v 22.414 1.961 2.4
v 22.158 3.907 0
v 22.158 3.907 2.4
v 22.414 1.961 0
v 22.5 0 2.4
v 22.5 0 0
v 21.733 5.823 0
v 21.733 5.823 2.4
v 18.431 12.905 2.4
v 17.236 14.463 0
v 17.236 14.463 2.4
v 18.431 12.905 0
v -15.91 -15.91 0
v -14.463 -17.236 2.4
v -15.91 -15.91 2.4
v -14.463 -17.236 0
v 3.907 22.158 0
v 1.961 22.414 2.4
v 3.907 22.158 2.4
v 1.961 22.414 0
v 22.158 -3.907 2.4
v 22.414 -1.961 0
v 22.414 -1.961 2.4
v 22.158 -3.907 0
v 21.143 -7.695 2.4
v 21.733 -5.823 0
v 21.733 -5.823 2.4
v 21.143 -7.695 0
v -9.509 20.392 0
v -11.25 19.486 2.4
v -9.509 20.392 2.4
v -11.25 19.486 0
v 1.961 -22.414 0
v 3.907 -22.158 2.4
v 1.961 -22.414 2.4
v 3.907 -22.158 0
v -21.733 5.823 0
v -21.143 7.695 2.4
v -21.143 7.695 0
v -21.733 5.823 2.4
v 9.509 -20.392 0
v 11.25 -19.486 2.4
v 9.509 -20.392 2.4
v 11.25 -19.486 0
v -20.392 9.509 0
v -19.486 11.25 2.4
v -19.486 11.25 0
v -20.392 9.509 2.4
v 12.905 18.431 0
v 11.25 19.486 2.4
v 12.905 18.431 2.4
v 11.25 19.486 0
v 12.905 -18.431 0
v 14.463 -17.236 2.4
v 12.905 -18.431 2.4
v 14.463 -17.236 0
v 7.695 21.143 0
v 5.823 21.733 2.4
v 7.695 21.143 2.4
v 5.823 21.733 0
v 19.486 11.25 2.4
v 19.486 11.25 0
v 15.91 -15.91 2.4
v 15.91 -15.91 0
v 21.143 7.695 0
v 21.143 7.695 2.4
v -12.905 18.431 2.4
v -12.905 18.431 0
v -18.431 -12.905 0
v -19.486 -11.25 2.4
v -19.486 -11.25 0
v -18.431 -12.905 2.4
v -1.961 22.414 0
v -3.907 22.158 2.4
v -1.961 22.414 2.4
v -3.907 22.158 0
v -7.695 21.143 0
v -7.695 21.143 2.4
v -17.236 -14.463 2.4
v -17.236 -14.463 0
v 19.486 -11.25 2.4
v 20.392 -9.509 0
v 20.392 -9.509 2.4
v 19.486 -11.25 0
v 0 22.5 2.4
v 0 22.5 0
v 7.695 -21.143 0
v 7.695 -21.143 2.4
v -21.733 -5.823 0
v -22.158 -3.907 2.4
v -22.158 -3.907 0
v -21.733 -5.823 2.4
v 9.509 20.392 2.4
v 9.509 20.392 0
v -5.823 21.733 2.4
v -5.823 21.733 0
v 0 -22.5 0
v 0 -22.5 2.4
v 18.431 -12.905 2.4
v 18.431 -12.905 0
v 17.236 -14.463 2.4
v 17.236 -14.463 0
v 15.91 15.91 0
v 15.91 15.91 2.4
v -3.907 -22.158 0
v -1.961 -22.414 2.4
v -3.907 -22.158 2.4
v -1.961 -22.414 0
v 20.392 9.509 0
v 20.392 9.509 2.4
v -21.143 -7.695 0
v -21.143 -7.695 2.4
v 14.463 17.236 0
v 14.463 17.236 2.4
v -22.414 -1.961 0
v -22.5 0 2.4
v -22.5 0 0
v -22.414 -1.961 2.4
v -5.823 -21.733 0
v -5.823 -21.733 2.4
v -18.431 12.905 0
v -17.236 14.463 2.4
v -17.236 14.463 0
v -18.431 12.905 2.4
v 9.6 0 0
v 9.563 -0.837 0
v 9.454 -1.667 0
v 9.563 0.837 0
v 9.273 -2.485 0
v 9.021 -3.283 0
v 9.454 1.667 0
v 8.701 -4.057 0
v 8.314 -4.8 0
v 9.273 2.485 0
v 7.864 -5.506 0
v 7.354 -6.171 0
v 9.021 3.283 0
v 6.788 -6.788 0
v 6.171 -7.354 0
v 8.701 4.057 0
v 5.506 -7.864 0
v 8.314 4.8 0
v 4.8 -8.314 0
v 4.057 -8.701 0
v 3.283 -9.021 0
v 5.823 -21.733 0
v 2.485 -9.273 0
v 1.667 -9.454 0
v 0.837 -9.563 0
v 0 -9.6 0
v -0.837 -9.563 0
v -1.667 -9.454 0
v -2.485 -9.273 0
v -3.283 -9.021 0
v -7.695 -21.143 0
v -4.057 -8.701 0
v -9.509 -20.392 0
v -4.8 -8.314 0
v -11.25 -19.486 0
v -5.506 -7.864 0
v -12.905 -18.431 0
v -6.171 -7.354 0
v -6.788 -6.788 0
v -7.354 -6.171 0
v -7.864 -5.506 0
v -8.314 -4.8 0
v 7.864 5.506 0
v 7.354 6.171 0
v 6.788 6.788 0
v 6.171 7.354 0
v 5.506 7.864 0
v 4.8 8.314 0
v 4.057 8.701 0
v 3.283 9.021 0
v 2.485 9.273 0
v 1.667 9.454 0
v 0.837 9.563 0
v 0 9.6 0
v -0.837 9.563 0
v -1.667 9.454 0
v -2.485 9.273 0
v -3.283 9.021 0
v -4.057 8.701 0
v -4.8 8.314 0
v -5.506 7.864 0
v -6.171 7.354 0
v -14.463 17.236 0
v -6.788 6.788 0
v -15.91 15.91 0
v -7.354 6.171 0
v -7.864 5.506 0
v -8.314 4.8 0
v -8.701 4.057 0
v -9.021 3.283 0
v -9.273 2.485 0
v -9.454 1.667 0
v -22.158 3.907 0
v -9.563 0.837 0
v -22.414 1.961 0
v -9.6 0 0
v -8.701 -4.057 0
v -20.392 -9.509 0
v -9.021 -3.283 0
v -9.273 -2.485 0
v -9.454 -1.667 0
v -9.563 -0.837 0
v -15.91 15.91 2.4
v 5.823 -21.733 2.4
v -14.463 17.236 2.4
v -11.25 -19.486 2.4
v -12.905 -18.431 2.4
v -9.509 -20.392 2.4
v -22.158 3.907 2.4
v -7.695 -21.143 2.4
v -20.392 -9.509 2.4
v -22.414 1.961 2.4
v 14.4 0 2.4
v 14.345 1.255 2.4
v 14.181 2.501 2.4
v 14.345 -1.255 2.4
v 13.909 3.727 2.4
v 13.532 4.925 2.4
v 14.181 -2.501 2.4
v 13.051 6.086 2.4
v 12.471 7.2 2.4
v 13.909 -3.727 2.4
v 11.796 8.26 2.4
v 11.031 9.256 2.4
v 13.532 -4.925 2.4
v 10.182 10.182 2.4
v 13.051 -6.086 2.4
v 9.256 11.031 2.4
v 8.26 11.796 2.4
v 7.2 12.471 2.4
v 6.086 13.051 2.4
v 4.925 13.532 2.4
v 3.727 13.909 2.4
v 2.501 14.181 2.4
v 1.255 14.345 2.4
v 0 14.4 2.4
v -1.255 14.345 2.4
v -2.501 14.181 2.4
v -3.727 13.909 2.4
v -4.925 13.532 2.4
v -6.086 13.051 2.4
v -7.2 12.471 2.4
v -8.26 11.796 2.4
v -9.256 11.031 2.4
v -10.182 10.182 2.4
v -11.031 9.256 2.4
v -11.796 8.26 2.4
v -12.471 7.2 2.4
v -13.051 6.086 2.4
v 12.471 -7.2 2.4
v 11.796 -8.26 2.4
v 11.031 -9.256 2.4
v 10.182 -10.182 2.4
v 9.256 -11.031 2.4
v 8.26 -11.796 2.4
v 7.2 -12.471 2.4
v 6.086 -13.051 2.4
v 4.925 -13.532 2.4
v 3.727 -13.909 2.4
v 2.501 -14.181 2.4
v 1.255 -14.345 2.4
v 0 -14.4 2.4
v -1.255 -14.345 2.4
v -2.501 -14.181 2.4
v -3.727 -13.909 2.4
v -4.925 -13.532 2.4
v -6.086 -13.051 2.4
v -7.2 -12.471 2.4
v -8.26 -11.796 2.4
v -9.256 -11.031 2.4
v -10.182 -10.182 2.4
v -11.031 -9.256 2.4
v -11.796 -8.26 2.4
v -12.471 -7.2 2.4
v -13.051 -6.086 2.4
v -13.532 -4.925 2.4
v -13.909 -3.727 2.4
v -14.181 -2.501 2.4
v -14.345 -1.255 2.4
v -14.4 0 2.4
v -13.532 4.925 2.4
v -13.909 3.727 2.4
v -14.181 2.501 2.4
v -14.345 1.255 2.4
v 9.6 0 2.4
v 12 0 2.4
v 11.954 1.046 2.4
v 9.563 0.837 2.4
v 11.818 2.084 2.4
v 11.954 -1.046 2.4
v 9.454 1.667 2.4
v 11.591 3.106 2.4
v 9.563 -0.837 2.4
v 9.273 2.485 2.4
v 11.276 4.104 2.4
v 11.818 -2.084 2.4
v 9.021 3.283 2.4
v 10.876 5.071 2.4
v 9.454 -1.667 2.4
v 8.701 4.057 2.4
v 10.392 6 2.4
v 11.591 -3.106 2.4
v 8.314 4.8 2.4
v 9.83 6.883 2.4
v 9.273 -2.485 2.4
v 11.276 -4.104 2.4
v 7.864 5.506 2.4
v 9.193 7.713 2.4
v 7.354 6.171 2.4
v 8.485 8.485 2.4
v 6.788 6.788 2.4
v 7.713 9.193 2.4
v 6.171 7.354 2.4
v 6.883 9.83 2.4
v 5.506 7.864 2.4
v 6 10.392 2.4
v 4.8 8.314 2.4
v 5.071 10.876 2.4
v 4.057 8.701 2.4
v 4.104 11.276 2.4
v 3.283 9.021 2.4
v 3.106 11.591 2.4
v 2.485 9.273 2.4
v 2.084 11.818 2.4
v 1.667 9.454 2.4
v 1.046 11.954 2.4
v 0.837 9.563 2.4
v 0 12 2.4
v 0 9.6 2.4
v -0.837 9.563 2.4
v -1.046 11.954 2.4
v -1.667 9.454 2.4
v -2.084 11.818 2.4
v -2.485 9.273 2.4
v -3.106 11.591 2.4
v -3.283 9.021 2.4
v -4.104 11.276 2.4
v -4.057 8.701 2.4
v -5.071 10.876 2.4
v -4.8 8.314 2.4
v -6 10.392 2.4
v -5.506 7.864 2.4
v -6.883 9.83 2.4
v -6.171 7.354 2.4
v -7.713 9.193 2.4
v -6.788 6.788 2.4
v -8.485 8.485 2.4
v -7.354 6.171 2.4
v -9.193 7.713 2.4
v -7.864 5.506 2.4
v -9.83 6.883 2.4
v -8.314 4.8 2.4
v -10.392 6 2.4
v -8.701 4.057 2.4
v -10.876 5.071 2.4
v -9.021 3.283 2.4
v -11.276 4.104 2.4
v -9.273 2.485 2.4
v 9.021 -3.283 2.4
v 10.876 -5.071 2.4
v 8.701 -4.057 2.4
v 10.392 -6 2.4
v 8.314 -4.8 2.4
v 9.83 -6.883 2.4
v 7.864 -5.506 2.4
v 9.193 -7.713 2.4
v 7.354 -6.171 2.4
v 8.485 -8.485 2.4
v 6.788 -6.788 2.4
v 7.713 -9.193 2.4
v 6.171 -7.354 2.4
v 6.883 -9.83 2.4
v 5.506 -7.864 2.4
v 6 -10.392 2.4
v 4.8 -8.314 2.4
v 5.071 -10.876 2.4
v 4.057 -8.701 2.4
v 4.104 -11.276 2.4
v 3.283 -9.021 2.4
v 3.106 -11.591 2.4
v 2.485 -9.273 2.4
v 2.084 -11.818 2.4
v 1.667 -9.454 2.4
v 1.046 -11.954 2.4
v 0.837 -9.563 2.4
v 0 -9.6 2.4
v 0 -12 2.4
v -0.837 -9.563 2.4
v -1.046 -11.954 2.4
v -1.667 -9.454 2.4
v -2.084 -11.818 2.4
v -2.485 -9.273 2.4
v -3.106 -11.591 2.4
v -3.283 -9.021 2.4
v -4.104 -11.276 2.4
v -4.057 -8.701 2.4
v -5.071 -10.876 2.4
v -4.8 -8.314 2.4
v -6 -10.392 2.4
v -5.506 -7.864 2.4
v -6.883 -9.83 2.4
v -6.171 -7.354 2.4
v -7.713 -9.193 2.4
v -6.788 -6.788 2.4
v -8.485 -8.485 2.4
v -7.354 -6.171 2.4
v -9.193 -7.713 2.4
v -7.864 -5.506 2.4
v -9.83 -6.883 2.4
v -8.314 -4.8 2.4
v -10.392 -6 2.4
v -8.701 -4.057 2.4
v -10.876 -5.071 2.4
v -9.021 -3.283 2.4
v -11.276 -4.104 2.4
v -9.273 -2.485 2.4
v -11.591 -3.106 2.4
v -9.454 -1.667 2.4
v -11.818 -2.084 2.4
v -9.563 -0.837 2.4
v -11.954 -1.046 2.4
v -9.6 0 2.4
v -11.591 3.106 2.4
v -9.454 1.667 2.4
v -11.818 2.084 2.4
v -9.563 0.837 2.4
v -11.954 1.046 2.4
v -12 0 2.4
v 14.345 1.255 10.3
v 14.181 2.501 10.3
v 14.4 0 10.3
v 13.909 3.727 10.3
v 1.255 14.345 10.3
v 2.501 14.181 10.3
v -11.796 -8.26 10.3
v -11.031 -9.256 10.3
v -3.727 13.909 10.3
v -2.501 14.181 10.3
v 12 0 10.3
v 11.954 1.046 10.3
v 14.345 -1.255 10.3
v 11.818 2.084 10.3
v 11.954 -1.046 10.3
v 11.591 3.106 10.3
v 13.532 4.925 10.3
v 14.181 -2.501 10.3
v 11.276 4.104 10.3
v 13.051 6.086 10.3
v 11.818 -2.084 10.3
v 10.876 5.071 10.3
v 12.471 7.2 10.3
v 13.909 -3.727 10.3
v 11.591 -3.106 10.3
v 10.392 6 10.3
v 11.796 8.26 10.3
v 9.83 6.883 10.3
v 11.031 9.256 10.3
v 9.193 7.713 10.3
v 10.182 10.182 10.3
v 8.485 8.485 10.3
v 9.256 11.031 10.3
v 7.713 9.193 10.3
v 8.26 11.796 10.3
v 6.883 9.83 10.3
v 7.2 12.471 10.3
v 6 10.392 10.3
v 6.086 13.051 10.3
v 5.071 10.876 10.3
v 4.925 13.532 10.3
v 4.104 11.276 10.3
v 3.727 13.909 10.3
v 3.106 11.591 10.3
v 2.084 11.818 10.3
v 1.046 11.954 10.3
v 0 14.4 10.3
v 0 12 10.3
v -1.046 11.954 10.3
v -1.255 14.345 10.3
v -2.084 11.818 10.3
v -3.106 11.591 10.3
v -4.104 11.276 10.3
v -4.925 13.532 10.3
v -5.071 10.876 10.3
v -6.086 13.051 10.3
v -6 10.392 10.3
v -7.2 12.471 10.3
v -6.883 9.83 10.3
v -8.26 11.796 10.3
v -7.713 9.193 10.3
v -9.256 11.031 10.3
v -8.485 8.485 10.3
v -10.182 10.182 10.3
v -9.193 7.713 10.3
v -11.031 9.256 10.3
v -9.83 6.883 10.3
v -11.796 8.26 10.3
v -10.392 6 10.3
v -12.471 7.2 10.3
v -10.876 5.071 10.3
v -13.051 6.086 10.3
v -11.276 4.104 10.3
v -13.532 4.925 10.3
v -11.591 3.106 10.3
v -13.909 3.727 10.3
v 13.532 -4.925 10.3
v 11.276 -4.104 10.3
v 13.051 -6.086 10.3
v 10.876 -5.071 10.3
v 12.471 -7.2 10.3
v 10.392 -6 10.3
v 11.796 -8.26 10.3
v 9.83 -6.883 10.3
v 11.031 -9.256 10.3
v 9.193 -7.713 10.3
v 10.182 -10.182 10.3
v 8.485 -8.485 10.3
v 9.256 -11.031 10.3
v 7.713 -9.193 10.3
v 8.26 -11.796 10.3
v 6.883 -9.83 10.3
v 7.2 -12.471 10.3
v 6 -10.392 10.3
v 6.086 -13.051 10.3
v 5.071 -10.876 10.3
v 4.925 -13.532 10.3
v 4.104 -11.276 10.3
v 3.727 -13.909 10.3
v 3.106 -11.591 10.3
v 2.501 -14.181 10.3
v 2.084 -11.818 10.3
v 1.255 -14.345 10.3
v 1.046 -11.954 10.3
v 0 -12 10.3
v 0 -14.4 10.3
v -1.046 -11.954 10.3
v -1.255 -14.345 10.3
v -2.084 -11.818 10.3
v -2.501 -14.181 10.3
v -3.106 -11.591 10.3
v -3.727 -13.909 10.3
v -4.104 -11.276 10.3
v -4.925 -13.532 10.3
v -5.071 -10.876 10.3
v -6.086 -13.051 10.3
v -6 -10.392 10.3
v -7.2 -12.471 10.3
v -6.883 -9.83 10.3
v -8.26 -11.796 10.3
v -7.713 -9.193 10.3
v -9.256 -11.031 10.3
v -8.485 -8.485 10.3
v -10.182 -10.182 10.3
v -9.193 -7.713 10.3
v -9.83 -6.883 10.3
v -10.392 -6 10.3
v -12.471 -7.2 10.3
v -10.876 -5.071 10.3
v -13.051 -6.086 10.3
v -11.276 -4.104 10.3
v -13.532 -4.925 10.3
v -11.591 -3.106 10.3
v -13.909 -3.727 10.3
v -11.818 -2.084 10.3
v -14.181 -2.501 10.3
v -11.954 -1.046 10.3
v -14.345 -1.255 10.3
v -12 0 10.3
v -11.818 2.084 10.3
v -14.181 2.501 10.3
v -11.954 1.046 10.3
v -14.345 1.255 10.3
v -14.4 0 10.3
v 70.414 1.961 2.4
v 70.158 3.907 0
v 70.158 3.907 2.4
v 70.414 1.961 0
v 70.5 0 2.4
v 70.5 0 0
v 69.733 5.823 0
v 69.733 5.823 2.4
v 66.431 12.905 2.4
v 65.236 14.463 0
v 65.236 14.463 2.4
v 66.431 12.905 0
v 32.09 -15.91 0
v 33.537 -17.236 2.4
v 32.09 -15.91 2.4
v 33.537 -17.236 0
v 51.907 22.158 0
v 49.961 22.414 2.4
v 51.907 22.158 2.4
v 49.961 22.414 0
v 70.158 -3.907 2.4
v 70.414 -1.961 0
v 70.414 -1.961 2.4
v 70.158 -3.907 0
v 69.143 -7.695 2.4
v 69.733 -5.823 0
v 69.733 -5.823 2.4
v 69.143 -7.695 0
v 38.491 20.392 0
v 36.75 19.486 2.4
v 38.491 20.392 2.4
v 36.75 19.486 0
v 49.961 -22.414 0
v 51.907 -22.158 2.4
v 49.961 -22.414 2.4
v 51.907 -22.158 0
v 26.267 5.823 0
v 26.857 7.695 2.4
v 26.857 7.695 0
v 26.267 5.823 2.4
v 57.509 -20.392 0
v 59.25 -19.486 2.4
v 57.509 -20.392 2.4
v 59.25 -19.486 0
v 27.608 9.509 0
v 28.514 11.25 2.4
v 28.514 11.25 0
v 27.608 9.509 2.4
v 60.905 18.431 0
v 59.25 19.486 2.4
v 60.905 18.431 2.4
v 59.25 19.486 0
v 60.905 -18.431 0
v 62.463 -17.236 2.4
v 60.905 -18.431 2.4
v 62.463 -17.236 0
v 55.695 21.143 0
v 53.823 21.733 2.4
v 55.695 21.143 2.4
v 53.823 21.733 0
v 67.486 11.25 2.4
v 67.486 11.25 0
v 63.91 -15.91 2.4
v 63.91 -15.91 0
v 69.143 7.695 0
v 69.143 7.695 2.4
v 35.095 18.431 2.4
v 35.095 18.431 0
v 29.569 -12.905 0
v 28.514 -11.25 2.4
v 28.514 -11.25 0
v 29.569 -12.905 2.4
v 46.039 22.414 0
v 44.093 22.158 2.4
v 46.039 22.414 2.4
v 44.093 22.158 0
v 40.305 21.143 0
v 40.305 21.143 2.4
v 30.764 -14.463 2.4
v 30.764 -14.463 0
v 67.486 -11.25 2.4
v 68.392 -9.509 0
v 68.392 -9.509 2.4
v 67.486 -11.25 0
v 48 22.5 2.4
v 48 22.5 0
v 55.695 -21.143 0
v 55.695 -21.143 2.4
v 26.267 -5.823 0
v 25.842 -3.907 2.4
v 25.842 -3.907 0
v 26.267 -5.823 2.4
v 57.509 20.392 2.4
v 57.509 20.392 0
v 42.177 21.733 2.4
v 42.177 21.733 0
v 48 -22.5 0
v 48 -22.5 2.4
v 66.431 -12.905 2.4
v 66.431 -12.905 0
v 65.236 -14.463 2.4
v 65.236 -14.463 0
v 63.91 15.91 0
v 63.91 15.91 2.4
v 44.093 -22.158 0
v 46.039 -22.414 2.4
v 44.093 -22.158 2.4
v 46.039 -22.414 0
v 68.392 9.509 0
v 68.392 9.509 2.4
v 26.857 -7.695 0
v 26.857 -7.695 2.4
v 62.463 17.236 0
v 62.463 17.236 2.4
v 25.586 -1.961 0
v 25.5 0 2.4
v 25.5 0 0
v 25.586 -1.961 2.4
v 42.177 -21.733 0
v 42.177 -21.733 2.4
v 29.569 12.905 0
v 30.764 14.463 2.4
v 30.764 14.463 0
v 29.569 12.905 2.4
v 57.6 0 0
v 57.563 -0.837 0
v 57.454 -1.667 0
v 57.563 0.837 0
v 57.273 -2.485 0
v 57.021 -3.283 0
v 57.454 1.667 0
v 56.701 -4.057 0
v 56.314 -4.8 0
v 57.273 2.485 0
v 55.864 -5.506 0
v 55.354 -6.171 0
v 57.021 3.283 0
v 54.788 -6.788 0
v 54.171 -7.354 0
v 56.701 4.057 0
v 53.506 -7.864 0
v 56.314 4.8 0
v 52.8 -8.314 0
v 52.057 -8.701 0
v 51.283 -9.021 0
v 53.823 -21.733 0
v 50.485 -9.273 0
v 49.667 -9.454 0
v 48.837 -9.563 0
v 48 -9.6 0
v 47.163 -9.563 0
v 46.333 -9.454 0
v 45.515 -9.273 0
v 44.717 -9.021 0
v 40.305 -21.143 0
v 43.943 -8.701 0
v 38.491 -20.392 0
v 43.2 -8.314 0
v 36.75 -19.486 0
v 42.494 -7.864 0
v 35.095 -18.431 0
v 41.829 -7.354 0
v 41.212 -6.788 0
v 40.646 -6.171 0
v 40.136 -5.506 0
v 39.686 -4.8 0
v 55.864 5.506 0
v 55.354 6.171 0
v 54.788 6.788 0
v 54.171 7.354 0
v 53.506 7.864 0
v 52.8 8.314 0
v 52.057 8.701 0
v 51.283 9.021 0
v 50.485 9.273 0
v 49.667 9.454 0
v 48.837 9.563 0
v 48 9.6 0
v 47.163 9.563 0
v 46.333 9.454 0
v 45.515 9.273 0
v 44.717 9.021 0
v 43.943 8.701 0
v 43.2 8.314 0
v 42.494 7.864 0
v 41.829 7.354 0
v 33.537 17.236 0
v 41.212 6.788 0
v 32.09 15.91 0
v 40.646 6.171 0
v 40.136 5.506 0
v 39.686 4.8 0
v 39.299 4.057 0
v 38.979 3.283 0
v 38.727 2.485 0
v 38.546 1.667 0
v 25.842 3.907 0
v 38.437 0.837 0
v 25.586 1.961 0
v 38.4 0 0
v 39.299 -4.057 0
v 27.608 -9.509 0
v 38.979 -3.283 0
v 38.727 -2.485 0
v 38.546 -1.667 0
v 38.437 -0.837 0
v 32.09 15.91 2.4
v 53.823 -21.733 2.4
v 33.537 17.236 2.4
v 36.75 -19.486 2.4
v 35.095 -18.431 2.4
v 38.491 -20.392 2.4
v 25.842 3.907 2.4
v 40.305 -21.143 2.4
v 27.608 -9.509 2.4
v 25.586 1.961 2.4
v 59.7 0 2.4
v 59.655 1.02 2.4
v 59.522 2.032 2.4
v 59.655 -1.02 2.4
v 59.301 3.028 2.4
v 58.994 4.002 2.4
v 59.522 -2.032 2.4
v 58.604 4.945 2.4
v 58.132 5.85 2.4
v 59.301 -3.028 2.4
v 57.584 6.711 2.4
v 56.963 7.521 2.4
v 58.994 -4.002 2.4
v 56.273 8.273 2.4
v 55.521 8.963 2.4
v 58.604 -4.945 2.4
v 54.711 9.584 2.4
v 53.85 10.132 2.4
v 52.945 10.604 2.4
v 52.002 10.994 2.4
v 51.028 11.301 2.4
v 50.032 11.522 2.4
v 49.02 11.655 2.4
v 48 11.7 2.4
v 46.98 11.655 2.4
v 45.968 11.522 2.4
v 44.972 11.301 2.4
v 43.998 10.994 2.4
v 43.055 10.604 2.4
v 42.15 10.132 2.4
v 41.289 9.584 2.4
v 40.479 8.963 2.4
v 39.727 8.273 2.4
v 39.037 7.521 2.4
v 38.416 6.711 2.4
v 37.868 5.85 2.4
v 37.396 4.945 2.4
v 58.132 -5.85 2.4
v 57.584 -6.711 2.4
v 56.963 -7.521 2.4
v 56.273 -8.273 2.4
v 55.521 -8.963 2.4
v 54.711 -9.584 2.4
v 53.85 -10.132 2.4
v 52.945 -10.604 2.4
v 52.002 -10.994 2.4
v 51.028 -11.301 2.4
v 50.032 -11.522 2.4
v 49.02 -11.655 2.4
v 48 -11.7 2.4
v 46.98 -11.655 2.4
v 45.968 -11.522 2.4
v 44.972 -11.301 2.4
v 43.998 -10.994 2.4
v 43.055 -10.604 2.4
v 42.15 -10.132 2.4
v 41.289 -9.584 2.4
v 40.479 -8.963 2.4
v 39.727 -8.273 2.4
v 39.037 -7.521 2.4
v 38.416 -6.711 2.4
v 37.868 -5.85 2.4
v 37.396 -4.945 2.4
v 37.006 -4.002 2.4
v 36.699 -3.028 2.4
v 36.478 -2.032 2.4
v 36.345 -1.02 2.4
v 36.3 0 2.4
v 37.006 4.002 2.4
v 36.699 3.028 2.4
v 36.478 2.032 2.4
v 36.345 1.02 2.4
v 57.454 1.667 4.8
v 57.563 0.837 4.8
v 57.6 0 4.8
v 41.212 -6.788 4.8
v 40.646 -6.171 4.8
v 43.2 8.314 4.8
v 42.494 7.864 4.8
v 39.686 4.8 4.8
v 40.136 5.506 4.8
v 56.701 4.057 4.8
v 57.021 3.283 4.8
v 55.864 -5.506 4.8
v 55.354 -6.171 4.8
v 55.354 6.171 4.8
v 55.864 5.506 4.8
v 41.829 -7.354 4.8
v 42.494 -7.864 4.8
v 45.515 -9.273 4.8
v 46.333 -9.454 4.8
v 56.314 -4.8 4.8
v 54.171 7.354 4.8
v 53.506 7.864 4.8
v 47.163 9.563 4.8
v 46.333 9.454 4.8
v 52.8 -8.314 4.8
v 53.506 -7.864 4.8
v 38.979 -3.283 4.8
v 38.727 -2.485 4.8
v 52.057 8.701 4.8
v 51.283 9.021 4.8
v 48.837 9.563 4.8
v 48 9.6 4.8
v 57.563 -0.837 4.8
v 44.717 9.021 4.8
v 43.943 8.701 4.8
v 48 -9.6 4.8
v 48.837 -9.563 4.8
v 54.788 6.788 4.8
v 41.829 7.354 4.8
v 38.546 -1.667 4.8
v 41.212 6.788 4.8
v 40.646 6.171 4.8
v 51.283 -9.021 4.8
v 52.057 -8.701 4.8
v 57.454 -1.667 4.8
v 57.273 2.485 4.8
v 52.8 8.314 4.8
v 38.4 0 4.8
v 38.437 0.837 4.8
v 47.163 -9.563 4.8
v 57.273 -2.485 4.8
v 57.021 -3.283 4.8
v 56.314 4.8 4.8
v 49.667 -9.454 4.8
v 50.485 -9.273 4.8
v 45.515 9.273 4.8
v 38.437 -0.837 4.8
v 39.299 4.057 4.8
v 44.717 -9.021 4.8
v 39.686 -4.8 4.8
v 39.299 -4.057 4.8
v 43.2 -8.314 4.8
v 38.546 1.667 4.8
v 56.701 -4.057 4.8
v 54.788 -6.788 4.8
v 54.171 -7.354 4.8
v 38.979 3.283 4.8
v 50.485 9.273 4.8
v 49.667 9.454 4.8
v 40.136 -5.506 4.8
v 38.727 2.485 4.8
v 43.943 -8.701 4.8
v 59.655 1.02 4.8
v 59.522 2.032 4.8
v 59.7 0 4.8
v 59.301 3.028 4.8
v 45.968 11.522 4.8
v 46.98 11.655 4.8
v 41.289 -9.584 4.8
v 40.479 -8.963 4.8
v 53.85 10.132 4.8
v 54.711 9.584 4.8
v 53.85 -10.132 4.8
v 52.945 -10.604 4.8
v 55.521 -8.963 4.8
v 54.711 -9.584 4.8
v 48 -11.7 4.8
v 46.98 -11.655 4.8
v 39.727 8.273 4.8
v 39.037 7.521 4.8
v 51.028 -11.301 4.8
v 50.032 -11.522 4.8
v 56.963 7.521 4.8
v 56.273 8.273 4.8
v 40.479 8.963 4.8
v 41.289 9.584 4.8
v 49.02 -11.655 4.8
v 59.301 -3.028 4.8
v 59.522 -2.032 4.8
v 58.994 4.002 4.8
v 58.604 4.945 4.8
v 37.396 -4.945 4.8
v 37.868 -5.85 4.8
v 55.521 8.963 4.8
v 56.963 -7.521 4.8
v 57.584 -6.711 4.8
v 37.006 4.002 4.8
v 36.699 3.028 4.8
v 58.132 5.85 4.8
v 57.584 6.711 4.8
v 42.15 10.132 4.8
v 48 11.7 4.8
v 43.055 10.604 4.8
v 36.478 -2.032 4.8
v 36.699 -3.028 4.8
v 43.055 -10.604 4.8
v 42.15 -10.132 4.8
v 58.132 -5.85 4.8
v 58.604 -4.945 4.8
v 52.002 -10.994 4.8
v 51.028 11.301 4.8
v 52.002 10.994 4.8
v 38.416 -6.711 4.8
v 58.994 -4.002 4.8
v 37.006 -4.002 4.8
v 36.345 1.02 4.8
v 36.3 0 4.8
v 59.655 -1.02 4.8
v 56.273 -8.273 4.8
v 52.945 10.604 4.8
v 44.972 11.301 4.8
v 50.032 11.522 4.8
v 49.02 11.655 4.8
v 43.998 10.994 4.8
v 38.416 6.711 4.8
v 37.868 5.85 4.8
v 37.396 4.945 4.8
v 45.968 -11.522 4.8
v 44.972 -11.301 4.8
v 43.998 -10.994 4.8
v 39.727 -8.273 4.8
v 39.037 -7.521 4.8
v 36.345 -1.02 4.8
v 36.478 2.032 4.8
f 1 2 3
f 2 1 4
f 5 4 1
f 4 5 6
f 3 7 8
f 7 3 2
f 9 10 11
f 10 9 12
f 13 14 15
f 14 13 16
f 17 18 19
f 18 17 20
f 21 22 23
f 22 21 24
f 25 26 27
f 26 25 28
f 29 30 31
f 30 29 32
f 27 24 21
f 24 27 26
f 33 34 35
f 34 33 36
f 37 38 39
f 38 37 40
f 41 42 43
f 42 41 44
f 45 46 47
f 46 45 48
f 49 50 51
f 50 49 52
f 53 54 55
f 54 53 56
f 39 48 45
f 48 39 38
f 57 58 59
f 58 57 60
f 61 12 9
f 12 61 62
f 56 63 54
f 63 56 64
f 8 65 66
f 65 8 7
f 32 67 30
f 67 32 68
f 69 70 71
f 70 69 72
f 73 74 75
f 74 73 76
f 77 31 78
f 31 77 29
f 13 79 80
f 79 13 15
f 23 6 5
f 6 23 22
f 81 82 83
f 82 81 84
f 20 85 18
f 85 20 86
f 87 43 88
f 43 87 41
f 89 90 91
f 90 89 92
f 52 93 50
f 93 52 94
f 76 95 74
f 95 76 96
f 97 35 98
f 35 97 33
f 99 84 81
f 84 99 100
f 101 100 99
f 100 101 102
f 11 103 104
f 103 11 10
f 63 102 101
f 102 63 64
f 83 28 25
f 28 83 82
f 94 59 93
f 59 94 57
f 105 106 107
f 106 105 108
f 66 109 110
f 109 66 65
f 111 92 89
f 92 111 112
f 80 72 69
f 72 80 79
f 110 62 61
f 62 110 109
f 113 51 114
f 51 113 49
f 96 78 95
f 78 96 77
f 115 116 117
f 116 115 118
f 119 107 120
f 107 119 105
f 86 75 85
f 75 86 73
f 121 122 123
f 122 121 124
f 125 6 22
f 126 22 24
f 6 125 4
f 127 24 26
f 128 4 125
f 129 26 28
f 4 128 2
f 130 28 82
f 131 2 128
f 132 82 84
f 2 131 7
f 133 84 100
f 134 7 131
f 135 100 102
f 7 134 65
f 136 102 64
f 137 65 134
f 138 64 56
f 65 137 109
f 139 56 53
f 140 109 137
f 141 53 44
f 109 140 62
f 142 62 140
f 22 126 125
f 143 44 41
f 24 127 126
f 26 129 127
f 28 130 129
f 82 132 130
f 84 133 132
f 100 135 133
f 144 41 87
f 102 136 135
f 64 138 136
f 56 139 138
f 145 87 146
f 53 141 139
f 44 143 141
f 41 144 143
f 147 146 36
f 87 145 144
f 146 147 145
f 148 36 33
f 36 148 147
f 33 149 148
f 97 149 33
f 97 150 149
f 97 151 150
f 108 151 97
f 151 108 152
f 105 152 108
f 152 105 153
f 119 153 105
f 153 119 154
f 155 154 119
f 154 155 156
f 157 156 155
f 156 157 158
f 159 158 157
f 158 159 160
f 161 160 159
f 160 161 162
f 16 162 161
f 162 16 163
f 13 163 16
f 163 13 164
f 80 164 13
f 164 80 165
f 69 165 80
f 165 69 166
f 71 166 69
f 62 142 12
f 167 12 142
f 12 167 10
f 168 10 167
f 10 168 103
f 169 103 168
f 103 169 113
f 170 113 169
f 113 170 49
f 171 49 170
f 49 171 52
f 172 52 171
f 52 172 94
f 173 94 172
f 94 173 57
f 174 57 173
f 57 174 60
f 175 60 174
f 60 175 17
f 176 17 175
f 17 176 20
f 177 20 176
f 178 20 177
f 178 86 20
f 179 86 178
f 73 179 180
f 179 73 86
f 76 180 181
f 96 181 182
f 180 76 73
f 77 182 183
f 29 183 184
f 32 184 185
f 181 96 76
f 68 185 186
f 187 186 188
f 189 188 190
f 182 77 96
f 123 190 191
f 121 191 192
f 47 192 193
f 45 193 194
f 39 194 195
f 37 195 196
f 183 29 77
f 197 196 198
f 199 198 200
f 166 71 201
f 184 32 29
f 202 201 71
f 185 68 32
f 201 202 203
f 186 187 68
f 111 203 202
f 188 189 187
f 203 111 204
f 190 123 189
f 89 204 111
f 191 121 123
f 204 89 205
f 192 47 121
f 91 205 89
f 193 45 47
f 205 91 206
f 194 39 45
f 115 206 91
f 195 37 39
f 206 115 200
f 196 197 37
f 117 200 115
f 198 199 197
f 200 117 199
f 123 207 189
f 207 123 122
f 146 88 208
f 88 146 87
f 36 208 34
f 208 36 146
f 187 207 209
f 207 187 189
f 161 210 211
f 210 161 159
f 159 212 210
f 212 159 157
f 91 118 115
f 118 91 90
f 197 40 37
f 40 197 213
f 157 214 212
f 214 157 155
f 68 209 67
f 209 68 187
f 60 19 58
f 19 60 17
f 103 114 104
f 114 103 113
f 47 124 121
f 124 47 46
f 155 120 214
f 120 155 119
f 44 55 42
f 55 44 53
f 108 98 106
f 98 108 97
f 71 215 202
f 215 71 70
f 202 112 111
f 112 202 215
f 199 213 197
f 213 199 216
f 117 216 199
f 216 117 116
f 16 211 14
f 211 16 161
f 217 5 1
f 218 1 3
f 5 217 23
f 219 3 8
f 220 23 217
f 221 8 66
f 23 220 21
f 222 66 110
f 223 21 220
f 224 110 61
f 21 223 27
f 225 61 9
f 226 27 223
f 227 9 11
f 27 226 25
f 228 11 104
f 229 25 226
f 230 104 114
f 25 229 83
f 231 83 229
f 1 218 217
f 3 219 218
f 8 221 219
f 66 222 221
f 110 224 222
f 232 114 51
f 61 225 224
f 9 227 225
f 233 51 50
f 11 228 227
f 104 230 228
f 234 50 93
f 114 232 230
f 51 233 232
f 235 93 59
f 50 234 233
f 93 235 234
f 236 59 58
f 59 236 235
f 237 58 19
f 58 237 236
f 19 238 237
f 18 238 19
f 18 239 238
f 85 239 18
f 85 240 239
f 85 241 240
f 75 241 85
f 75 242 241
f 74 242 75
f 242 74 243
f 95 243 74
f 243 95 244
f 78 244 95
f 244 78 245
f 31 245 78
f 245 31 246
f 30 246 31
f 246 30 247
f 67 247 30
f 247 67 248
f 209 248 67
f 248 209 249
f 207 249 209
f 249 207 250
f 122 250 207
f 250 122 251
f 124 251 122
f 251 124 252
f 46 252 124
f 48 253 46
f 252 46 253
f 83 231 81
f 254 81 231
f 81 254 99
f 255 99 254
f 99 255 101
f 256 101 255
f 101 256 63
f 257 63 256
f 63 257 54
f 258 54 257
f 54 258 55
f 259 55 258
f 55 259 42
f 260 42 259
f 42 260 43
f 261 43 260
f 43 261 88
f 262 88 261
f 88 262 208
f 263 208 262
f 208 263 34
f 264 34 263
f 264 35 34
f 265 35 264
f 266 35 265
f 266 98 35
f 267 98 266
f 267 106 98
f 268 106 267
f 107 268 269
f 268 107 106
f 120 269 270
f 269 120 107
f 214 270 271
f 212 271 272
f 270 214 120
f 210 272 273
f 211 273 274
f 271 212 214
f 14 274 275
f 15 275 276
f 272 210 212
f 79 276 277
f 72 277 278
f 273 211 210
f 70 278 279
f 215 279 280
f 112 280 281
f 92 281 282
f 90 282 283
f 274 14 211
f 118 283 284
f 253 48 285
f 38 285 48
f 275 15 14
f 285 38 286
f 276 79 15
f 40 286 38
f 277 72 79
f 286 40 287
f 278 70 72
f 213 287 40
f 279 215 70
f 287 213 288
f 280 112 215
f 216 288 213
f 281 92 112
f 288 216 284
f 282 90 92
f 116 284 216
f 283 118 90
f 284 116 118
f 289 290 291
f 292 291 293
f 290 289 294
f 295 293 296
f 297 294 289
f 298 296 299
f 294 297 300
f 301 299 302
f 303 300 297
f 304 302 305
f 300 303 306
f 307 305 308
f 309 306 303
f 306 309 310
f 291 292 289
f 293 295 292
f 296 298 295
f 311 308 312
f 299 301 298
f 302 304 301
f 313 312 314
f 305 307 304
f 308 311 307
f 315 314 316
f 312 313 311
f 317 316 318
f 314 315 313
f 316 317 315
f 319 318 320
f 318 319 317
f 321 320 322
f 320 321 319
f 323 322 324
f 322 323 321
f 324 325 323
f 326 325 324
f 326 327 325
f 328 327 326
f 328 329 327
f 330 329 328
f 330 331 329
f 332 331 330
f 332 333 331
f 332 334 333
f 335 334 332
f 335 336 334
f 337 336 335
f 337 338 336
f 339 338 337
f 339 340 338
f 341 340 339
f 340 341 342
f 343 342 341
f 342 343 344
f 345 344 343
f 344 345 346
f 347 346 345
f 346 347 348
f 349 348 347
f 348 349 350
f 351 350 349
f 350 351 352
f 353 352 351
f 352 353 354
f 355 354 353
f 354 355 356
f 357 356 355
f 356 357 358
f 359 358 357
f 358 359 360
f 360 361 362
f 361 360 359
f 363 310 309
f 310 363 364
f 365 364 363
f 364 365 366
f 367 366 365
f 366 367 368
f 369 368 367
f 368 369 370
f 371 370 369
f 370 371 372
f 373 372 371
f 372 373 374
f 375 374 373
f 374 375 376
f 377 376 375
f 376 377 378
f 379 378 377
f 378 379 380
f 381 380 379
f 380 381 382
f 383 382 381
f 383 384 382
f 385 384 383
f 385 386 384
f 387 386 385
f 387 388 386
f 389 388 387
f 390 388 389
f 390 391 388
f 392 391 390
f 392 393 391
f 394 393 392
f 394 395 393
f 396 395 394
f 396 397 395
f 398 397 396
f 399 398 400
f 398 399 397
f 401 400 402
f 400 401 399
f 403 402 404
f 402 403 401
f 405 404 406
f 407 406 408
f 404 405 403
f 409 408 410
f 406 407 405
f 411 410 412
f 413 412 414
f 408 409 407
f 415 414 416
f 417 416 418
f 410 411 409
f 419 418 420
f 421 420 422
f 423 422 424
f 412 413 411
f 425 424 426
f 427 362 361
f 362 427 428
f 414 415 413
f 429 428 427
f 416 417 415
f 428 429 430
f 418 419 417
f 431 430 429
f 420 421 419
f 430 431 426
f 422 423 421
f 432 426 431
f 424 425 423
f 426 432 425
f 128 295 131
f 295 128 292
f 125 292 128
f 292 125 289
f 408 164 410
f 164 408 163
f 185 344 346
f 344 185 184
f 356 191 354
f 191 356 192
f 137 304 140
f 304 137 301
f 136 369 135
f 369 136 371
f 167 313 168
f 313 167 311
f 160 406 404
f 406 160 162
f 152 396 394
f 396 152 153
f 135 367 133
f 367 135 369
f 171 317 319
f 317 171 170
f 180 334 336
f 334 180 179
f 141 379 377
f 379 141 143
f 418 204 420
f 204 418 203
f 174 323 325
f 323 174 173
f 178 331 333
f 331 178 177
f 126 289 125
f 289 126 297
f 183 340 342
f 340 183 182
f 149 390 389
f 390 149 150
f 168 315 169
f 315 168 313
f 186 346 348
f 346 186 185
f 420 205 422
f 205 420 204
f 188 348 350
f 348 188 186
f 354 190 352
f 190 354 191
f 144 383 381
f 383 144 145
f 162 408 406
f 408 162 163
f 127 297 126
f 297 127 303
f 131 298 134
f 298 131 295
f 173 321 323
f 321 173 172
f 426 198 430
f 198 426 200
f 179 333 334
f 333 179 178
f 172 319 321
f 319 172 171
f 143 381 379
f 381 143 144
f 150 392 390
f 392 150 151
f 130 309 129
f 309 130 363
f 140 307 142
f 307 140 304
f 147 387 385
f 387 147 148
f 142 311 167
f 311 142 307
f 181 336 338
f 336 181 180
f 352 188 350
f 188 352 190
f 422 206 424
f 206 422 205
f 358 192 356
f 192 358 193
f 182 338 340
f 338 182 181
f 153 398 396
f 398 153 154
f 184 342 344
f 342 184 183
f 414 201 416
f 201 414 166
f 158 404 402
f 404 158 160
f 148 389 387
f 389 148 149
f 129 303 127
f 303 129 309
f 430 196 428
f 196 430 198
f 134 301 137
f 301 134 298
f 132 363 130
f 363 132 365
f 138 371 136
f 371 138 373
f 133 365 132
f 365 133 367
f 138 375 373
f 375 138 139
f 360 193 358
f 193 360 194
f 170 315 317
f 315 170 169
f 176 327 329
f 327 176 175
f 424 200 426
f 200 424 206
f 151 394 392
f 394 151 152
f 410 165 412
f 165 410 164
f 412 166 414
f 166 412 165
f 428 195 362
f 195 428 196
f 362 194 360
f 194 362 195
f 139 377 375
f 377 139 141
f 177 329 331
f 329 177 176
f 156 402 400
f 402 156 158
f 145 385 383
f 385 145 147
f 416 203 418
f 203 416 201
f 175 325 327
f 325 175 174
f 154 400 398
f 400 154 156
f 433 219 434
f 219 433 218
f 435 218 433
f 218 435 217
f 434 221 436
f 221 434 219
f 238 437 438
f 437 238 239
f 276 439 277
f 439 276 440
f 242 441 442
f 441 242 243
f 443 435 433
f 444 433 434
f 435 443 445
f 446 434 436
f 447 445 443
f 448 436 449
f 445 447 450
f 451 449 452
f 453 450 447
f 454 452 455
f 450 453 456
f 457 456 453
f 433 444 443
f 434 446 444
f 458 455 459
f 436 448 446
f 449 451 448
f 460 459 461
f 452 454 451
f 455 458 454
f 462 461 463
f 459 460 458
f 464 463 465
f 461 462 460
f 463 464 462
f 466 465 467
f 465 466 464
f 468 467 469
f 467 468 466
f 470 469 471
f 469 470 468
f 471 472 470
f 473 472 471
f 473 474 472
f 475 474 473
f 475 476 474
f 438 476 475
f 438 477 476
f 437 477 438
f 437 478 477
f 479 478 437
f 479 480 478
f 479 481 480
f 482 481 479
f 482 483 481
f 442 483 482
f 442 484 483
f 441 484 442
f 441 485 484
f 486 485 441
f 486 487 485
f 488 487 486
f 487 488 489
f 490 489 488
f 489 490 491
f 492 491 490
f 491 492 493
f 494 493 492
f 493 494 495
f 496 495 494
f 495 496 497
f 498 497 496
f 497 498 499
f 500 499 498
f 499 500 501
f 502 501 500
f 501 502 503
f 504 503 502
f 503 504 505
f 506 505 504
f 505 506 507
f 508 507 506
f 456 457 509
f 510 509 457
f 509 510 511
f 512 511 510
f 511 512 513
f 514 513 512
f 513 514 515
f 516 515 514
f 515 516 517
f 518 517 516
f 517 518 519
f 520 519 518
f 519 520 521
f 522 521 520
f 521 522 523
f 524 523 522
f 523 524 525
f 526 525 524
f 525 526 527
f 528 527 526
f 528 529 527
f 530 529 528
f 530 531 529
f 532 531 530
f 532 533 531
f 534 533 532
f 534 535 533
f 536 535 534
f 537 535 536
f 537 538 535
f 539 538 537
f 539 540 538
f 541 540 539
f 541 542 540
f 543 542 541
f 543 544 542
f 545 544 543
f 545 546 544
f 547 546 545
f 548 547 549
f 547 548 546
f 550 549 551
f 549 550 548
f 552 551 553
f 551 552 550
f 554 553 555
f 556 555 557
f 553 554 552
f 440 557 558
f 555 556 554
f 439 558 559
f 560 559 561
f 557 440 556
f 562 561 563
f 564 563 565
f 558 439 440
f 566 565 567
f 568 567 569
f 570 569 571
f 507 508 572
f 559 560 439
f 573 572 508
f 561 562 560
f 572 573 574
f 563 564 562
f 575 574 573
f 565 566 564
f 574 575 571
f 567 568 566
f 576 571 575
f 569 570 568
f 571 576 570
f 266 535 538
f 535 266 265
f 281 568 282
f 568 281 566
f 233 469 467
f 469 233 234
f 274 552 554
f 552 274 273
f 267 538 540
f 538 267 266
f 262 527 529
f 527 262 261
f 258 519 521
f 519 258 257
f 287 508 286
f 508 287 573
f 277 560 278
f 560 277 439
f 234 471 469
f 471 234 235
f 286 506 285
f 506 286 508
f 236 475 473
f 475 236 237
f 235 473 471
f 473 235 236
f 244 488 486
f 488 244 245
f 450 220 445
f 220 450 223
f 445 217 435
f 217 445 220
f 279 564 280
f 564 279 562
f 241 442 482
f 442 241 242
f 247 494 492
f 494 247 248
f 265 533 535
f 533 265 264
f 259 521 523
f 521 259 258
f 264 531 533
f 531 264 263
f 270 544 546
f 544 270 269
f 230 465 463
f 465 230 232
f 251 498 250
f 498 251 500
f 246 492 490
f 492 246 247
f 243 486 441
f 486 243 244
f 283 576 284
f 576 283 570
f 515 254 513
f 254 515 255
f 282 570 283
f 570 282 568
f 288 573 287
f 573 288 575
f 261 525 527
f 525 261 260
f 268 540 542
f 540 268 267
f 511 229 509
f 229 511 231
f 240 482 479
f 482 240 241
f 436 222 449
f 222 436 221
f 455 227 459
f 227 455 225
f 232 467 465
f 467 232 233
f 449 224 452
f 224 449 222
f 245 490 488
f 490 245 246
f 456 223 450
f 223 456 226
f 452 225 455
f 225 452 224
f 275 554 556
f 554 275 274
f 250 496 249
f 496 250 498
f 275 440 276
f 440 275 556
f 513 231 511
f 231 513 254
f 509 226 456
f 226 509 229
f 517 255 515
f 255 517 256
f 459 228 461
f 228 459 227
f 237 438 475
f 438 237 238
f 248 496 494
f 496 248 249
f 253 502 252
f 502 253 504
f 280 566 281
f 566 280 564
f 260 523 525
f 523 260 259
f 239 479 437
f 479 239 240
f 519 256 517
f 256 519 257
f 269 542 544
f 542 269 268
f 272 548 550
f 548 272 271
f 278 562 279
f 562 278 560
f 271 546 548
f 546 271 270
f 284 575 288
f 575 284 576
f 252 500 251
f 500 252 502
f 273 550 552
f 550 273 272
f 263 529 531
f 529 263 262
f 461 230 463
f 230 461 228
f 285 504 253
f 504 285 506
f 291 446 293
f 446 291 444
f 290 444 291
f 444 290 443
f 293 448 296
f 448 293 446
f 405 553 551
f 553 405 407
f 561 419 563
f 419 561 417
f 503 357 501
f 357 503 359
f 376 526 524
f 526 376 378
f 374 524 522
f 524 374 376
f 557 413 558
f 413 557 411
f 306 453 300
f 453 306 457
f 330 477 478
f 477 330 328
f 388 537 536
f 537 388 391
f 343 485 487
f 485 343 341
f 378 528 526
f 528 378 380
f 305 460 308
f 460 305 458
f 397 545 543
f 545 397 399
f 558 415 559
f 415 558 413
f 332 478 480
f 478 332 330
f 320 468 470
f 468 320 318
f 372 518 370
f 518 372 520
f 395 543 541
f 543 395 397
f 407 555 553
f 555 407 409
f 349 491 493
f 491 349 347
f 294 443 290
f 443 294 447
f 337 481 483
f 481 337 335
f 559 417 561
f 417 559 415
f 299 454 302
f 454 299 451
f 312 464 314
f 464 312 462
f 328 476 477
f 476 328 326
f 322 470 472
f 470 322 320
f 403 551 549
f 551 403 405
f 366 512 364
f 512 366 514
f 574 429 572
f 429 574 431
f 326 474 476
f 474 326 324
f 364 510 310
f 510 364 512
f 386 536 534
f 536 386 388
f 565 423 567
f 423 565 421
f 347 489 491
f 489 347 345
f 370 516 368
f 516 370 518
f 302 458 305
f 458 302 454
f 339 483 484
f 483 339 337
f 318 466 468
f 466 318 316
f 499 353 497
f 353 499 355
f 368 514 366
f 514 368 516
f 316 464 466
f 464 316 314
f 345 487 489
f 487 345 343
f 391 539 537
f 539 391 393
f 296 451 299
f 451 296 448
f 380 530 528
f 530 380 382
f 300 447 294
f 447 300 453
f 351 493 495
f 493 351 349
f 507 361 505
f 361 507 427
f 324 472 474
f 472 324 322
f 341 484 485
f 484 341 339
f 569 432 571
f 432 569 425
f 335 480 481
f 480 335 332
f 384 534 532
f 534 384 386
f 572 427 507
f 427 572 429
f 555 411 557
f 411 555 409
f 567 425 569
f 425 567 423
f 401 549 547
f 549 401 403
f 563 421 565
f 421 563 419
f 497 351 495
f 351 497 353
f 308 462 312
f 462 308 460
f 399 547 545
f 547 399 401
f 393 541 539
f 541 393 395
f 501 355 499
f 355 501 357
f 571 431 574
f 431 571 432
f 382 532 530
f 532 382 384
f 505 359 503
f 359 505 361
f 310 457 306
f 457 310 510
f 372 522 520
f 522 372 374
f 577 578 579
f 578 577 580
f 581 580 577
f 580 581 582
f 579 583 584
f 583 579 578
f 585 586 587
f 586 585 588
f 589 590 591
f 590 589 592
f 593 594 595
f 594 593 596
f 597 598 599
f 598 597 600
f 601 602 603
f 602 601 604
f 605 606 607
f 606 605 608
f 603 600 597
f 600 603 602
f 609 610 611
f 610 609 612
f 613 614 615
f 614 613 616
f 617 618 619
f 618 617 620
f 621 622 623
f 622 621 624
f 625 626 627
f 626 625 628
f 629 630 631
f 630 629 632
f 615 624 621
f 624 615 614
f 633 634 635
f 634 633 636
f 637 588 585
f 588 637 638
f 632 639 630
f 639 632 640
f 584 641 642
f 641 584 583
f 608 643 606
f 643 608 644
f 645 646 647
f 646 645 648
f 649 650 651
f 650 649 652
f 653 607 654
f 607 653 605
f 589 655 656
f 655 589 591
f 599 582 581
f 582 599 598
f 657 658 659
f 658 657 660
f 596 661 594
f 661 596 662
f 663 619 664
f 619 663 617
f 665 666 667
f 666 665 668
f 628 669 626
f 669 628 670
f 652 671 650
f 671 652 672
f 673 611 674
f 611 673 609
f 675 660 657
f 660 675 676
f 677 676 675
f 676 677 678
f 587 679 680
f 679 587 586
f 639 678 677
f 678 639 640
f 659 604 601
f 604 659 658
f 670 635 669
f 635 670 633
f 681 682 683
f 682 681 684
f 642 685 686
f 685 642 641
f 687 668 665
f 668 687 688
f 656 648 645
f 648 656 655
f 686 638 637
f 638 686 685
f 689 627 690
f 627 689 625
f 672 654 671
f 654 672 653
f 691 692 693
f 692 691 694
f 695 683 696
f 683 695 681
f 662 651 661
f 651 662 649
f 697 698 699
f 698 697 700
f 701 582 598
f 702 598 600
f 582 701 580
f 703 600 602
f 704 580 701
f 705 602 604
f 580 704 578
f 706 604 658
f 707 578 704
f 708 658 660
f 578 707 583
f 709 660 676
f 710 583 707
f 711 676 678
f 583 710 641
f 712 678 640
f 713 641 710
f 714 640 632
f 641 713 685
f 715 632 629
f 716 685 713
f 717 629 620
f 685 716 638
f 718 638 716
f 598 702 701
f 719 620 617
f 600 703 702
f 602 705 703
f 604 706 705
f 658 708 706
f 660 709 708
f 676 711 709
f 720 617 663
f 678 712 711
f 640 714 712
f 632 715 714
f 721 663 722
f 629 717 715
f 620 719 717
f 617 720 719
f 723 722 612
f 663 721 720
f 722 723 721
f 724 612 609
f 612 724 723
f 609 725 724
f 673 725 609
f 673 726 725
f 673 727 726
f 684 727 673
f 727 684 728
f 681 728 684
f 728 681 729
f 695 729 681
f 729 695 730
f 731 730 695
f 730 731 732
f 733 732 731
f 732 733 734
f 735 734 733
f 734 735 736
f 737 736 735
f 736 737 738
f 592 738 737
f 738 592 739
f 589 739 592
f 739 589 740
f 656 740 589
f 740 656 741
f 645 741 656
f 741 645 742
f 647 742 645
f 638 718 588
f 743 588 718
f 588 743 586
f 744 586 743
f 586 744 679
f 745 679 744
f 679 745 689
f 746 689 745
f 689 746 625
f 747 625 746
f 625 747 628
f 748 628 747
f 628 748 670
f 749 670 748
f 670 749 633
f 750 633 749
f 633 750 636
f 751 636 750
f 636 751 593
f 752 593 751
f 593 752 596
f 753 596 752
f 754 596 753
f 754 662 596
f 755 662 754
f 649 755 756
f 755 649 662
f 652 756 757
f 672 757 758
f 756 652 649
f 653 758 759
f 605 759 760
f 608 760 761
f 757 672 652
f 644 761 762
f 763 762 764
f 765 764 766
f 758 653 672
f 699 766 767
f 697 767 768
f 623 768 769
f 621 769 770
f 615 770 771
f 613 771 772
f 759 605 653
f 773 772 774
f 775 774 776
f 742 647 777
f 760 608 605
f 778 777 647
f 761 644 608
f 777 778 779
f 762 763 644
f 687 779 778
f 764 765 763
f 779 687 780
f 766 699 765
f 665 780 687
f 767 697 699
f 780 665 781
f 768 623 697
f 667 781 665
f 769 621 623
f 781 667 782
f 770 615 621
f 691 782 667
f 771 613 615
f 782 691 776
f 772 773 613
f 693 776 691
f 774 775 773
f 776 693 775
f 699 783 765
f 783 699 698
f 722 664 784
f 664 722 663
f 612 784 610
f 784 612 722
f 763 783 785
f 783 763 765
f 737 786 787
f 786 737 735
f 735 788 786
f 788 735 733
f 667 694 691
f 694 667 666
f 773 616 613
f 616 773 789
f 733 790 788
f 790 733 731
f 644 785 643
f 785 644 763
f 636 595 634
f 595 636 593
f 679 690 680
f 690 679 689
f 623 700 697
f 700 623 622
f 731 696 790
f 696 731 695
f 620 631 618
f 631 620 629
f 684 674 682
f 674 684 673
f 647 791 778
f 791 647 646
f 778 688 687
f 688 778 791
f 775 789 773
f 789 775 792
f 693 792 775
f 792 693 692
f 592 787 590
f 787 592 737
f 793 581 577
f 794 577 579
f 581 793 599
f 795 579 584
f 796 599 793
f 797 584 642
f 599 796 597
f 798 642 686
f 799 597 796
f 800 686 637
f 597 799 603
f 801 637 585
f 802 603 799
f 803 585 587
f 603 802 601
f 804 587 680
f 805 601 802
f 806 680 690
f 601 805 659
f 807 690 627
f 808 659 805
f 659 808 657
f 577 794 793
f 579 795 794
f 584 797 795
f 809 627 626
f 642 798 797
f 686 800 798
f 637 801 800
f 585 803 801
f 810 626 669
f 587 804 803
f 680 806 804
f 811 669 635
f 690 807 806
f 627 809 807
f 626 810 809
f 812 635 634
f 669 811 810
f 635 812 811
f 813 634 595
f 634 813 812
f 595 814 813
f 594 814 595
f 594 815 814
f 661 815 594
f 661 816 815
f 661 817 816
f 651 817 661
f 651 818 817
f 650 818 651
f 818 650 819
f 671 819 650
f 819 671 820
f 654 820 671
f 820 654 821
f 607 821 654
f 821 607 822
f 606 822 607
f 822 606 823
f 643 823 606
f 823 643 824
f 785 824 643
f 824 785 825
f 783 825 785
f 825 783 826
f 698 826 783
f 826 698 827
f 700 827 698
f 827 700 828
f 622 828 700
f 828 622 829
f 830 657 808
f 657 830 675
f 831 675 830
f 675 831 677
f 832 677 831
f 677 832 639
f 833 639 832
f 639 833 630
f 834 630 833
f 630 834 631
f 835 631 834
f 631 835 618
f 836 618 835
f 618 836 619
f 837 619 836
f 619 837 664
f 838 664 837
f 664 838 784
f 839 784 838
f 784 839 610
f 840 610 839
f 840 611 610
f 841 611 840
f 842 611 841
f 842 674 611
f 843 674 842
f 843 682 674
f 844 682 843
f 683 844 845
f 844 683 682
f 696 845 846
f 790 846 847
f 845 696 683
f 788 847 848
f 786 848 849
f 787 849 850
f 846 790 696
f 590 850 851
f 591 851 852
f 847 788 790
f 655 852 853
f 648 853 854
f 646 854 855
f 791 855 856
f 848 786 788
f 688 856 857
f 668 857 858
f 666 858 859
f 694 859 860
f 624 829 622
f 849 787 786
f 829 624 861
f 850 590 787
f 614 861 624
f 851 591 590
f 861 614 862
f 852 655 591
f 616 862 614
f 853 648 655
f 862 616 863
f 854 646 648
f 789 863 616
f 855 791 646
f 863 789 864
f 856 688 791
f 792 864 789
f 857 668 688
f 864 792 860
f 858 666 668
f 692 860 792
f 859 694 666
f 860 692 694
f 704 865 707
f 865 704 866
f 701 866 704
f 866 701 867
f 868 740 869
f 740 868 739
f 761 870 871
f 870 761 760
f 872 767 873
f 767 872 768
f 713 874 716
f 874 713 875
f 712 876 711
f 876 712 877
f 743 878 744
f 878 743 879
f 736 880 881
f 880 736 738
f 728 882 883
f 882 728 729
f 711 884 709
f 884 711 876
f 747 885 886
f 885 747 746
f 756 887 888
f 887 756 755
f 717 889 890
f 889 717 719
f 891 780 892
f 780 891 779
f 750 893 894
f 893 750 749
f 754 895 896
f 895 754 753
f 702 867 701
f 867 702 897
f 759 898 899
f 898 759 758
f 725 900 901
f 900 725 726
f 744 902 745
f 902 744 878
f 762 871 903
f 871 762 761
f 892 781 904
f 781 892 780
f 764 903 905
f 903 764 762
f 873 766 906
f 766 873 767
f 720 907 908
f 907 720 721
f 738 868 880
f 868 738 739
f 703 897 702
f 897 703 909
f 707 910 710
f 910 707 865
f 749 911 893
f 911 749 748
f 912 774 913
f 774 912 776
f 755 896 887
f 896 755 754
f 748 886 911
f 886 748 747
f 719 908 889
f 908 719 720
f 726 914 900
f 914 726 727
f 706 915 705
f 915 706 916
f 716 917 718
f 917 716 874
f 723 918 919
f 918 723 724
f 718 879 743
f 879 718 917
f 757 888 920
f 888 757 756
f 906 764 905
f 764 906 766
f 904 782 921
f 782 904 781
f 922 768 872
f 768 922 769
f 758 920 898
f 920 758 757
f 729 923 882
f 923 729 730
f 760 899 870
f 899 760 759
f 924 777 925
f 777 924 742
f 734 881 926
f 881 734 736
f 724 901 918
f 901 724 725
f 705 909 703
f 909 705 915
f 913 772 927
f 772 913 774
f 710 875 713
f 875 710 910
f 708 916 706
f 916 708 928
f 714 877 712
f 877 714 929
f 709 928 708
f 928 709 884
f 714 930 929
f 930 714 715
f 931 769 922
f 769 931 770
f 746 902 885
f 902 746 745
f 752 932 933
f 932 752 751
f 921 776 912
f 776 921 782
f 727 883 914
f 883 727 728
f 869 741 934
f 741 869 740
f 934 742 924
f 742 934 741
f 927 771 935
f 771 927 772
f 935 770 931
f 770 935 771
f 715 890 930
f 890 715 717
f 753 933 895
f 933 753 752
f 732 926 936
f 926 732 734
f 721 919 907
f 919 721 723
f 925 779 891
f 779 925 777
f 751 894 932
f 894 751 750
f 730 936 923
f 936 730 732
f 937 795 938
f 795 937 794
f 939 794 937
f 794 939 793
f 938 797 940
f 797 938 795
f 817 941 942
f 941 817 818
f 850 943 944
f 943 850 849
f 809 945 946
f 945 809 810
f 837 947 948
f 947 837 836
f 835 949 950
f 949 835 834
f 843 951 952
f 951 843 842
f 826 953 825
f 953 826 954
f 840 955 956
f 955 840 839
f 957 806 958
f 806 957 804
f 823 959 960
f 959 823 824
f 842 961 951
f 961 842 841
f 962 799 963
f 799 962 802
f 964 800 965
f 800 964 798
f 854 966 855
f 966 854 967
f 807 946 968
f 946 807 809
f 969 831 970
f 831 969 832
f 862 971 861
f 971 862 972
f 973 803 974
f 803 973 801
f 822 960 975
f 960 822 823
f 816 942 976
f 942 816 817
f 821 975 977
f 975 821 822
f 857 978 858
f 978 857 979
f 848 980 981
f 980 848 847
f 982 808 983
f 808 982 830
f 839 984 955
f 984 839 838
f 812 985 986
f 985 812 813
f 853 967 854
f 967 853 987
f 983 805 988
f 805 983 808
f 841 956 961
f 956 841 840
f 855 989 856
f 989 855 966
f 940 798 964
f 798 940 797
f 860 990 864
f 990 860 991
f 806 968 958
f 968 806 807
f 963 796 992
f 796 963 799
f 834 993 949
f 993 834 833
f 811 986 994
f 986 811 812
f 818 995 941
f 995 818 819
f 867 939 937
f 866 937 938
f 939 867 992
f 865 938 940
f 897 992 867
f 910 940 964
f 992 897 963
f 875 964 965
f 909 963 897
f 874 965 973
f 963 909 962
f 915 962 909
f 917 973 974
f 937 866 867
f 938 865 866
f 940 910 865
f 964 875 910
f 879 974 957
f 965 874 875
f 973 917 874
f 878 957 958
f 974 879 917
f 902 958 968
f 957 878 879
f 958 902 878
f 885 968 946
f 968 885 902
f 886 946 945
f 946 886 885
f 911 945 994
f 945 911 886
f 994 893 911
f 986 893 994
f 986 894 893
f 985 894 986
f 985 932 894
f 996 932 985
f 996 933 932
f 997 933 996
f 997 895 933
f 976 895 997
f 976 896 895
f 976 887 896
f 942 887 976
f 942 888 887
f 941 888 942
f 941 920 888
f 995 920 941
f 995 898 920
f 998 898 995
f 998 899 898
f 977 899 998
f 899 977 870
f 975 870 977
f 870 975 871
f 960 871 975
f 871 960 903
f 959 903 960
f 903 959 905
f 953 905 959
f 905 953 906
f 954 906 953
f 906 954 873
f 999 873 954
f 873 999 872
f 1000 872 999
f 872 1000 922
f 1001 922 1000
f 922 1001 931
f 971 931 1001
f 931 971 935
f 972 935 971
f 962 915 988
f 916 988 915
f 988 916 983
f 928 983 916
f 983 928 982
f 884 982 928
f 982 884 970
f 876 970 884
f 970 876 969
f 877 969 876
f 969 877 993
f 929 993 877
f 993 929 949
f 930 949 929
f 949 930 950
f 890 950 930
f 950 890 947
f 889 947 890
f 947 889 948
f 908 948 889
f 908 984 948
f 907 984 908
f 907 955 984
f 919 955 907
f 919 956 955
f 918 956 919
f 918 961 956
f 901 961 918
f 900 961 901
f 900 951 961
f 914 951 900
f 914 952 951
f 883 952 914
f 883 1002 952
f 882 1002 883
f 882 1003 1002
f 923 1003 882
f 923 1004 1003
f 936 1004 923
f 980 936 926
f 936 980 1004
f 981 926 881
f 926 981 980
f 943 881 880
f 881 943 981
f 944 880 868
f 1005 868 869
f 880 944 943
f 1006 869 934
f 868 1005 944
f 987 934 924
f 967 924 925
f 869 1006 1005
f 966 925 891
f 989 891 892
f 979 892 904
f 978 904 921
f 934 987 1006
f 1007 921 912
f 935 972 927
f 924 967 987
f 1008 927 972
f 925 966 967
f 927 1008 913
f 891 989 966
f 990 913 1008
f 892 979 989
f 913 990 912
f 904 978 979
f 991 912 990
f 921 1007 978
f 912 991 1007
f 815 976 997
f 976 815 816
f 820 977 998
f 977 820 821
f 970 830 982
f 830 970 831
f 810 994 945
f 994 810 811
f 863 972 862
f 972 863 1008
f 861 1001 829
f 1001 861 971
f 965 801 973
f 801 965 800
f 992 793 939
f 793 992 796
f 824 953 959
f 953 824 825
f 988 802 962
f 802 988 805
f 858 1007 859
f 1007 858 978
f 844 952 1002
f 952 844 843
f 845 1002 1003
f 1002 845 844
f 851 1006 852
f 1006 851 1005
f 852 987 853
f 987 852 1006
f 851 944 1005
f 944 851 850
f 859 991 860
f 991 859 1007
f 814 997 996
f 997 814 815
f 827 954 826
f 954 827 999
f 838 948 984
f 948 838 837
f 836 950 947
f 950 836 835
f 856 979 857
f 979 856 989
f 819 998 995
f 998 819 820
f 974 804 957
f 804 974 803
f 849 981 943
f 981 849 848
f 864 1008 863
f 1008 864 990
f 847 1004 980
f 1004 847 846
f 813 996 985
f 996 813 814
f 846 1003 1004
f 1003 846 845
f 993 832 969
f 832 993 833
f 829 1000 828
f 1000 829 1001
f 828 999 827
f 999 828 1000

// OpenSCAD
//$fn=60;
$fa=5;
$fs=.4;

in_dia = 24;
in_width = 5.5;
wall_thick=2.4;
all_dia = 45;
tolerance = 0.6;

wheel_A();
translate([0,0,in_width+3*wall_thick+tolerance]) rotate([180,0,0]) wheel_B();

!for_print();

module for_print(){
    wheel_A();
    translate([48,0,0]) wheel_B();
}
    

module wheel_B(){
    difference(){
        cylinder(d=all_dia,h=wall_thick);
        cylinder(d=in_dia-2*wall_thick,h=wall_thick);
    }
    difference(){
        cylinder(d=in_dia-tolerance,h=2*wall_thick);
        cylinder(d=in_dia-2*wall_thick,h=2*wall_thick);
    }
}

module wheel_A(){
    difference(){
        cylinder(d=all_dia,h=wall_thick);
        cylinder(d=in_dia-2*wall_thick,h=wall_thick);
    }
    difference(){
        cylinder(d=in_dia+2*wall_thick,h=in_width+2*wall_thick);
        cylinder(d=in_dia,h=in_width+2*wall_thick);
    }
}
